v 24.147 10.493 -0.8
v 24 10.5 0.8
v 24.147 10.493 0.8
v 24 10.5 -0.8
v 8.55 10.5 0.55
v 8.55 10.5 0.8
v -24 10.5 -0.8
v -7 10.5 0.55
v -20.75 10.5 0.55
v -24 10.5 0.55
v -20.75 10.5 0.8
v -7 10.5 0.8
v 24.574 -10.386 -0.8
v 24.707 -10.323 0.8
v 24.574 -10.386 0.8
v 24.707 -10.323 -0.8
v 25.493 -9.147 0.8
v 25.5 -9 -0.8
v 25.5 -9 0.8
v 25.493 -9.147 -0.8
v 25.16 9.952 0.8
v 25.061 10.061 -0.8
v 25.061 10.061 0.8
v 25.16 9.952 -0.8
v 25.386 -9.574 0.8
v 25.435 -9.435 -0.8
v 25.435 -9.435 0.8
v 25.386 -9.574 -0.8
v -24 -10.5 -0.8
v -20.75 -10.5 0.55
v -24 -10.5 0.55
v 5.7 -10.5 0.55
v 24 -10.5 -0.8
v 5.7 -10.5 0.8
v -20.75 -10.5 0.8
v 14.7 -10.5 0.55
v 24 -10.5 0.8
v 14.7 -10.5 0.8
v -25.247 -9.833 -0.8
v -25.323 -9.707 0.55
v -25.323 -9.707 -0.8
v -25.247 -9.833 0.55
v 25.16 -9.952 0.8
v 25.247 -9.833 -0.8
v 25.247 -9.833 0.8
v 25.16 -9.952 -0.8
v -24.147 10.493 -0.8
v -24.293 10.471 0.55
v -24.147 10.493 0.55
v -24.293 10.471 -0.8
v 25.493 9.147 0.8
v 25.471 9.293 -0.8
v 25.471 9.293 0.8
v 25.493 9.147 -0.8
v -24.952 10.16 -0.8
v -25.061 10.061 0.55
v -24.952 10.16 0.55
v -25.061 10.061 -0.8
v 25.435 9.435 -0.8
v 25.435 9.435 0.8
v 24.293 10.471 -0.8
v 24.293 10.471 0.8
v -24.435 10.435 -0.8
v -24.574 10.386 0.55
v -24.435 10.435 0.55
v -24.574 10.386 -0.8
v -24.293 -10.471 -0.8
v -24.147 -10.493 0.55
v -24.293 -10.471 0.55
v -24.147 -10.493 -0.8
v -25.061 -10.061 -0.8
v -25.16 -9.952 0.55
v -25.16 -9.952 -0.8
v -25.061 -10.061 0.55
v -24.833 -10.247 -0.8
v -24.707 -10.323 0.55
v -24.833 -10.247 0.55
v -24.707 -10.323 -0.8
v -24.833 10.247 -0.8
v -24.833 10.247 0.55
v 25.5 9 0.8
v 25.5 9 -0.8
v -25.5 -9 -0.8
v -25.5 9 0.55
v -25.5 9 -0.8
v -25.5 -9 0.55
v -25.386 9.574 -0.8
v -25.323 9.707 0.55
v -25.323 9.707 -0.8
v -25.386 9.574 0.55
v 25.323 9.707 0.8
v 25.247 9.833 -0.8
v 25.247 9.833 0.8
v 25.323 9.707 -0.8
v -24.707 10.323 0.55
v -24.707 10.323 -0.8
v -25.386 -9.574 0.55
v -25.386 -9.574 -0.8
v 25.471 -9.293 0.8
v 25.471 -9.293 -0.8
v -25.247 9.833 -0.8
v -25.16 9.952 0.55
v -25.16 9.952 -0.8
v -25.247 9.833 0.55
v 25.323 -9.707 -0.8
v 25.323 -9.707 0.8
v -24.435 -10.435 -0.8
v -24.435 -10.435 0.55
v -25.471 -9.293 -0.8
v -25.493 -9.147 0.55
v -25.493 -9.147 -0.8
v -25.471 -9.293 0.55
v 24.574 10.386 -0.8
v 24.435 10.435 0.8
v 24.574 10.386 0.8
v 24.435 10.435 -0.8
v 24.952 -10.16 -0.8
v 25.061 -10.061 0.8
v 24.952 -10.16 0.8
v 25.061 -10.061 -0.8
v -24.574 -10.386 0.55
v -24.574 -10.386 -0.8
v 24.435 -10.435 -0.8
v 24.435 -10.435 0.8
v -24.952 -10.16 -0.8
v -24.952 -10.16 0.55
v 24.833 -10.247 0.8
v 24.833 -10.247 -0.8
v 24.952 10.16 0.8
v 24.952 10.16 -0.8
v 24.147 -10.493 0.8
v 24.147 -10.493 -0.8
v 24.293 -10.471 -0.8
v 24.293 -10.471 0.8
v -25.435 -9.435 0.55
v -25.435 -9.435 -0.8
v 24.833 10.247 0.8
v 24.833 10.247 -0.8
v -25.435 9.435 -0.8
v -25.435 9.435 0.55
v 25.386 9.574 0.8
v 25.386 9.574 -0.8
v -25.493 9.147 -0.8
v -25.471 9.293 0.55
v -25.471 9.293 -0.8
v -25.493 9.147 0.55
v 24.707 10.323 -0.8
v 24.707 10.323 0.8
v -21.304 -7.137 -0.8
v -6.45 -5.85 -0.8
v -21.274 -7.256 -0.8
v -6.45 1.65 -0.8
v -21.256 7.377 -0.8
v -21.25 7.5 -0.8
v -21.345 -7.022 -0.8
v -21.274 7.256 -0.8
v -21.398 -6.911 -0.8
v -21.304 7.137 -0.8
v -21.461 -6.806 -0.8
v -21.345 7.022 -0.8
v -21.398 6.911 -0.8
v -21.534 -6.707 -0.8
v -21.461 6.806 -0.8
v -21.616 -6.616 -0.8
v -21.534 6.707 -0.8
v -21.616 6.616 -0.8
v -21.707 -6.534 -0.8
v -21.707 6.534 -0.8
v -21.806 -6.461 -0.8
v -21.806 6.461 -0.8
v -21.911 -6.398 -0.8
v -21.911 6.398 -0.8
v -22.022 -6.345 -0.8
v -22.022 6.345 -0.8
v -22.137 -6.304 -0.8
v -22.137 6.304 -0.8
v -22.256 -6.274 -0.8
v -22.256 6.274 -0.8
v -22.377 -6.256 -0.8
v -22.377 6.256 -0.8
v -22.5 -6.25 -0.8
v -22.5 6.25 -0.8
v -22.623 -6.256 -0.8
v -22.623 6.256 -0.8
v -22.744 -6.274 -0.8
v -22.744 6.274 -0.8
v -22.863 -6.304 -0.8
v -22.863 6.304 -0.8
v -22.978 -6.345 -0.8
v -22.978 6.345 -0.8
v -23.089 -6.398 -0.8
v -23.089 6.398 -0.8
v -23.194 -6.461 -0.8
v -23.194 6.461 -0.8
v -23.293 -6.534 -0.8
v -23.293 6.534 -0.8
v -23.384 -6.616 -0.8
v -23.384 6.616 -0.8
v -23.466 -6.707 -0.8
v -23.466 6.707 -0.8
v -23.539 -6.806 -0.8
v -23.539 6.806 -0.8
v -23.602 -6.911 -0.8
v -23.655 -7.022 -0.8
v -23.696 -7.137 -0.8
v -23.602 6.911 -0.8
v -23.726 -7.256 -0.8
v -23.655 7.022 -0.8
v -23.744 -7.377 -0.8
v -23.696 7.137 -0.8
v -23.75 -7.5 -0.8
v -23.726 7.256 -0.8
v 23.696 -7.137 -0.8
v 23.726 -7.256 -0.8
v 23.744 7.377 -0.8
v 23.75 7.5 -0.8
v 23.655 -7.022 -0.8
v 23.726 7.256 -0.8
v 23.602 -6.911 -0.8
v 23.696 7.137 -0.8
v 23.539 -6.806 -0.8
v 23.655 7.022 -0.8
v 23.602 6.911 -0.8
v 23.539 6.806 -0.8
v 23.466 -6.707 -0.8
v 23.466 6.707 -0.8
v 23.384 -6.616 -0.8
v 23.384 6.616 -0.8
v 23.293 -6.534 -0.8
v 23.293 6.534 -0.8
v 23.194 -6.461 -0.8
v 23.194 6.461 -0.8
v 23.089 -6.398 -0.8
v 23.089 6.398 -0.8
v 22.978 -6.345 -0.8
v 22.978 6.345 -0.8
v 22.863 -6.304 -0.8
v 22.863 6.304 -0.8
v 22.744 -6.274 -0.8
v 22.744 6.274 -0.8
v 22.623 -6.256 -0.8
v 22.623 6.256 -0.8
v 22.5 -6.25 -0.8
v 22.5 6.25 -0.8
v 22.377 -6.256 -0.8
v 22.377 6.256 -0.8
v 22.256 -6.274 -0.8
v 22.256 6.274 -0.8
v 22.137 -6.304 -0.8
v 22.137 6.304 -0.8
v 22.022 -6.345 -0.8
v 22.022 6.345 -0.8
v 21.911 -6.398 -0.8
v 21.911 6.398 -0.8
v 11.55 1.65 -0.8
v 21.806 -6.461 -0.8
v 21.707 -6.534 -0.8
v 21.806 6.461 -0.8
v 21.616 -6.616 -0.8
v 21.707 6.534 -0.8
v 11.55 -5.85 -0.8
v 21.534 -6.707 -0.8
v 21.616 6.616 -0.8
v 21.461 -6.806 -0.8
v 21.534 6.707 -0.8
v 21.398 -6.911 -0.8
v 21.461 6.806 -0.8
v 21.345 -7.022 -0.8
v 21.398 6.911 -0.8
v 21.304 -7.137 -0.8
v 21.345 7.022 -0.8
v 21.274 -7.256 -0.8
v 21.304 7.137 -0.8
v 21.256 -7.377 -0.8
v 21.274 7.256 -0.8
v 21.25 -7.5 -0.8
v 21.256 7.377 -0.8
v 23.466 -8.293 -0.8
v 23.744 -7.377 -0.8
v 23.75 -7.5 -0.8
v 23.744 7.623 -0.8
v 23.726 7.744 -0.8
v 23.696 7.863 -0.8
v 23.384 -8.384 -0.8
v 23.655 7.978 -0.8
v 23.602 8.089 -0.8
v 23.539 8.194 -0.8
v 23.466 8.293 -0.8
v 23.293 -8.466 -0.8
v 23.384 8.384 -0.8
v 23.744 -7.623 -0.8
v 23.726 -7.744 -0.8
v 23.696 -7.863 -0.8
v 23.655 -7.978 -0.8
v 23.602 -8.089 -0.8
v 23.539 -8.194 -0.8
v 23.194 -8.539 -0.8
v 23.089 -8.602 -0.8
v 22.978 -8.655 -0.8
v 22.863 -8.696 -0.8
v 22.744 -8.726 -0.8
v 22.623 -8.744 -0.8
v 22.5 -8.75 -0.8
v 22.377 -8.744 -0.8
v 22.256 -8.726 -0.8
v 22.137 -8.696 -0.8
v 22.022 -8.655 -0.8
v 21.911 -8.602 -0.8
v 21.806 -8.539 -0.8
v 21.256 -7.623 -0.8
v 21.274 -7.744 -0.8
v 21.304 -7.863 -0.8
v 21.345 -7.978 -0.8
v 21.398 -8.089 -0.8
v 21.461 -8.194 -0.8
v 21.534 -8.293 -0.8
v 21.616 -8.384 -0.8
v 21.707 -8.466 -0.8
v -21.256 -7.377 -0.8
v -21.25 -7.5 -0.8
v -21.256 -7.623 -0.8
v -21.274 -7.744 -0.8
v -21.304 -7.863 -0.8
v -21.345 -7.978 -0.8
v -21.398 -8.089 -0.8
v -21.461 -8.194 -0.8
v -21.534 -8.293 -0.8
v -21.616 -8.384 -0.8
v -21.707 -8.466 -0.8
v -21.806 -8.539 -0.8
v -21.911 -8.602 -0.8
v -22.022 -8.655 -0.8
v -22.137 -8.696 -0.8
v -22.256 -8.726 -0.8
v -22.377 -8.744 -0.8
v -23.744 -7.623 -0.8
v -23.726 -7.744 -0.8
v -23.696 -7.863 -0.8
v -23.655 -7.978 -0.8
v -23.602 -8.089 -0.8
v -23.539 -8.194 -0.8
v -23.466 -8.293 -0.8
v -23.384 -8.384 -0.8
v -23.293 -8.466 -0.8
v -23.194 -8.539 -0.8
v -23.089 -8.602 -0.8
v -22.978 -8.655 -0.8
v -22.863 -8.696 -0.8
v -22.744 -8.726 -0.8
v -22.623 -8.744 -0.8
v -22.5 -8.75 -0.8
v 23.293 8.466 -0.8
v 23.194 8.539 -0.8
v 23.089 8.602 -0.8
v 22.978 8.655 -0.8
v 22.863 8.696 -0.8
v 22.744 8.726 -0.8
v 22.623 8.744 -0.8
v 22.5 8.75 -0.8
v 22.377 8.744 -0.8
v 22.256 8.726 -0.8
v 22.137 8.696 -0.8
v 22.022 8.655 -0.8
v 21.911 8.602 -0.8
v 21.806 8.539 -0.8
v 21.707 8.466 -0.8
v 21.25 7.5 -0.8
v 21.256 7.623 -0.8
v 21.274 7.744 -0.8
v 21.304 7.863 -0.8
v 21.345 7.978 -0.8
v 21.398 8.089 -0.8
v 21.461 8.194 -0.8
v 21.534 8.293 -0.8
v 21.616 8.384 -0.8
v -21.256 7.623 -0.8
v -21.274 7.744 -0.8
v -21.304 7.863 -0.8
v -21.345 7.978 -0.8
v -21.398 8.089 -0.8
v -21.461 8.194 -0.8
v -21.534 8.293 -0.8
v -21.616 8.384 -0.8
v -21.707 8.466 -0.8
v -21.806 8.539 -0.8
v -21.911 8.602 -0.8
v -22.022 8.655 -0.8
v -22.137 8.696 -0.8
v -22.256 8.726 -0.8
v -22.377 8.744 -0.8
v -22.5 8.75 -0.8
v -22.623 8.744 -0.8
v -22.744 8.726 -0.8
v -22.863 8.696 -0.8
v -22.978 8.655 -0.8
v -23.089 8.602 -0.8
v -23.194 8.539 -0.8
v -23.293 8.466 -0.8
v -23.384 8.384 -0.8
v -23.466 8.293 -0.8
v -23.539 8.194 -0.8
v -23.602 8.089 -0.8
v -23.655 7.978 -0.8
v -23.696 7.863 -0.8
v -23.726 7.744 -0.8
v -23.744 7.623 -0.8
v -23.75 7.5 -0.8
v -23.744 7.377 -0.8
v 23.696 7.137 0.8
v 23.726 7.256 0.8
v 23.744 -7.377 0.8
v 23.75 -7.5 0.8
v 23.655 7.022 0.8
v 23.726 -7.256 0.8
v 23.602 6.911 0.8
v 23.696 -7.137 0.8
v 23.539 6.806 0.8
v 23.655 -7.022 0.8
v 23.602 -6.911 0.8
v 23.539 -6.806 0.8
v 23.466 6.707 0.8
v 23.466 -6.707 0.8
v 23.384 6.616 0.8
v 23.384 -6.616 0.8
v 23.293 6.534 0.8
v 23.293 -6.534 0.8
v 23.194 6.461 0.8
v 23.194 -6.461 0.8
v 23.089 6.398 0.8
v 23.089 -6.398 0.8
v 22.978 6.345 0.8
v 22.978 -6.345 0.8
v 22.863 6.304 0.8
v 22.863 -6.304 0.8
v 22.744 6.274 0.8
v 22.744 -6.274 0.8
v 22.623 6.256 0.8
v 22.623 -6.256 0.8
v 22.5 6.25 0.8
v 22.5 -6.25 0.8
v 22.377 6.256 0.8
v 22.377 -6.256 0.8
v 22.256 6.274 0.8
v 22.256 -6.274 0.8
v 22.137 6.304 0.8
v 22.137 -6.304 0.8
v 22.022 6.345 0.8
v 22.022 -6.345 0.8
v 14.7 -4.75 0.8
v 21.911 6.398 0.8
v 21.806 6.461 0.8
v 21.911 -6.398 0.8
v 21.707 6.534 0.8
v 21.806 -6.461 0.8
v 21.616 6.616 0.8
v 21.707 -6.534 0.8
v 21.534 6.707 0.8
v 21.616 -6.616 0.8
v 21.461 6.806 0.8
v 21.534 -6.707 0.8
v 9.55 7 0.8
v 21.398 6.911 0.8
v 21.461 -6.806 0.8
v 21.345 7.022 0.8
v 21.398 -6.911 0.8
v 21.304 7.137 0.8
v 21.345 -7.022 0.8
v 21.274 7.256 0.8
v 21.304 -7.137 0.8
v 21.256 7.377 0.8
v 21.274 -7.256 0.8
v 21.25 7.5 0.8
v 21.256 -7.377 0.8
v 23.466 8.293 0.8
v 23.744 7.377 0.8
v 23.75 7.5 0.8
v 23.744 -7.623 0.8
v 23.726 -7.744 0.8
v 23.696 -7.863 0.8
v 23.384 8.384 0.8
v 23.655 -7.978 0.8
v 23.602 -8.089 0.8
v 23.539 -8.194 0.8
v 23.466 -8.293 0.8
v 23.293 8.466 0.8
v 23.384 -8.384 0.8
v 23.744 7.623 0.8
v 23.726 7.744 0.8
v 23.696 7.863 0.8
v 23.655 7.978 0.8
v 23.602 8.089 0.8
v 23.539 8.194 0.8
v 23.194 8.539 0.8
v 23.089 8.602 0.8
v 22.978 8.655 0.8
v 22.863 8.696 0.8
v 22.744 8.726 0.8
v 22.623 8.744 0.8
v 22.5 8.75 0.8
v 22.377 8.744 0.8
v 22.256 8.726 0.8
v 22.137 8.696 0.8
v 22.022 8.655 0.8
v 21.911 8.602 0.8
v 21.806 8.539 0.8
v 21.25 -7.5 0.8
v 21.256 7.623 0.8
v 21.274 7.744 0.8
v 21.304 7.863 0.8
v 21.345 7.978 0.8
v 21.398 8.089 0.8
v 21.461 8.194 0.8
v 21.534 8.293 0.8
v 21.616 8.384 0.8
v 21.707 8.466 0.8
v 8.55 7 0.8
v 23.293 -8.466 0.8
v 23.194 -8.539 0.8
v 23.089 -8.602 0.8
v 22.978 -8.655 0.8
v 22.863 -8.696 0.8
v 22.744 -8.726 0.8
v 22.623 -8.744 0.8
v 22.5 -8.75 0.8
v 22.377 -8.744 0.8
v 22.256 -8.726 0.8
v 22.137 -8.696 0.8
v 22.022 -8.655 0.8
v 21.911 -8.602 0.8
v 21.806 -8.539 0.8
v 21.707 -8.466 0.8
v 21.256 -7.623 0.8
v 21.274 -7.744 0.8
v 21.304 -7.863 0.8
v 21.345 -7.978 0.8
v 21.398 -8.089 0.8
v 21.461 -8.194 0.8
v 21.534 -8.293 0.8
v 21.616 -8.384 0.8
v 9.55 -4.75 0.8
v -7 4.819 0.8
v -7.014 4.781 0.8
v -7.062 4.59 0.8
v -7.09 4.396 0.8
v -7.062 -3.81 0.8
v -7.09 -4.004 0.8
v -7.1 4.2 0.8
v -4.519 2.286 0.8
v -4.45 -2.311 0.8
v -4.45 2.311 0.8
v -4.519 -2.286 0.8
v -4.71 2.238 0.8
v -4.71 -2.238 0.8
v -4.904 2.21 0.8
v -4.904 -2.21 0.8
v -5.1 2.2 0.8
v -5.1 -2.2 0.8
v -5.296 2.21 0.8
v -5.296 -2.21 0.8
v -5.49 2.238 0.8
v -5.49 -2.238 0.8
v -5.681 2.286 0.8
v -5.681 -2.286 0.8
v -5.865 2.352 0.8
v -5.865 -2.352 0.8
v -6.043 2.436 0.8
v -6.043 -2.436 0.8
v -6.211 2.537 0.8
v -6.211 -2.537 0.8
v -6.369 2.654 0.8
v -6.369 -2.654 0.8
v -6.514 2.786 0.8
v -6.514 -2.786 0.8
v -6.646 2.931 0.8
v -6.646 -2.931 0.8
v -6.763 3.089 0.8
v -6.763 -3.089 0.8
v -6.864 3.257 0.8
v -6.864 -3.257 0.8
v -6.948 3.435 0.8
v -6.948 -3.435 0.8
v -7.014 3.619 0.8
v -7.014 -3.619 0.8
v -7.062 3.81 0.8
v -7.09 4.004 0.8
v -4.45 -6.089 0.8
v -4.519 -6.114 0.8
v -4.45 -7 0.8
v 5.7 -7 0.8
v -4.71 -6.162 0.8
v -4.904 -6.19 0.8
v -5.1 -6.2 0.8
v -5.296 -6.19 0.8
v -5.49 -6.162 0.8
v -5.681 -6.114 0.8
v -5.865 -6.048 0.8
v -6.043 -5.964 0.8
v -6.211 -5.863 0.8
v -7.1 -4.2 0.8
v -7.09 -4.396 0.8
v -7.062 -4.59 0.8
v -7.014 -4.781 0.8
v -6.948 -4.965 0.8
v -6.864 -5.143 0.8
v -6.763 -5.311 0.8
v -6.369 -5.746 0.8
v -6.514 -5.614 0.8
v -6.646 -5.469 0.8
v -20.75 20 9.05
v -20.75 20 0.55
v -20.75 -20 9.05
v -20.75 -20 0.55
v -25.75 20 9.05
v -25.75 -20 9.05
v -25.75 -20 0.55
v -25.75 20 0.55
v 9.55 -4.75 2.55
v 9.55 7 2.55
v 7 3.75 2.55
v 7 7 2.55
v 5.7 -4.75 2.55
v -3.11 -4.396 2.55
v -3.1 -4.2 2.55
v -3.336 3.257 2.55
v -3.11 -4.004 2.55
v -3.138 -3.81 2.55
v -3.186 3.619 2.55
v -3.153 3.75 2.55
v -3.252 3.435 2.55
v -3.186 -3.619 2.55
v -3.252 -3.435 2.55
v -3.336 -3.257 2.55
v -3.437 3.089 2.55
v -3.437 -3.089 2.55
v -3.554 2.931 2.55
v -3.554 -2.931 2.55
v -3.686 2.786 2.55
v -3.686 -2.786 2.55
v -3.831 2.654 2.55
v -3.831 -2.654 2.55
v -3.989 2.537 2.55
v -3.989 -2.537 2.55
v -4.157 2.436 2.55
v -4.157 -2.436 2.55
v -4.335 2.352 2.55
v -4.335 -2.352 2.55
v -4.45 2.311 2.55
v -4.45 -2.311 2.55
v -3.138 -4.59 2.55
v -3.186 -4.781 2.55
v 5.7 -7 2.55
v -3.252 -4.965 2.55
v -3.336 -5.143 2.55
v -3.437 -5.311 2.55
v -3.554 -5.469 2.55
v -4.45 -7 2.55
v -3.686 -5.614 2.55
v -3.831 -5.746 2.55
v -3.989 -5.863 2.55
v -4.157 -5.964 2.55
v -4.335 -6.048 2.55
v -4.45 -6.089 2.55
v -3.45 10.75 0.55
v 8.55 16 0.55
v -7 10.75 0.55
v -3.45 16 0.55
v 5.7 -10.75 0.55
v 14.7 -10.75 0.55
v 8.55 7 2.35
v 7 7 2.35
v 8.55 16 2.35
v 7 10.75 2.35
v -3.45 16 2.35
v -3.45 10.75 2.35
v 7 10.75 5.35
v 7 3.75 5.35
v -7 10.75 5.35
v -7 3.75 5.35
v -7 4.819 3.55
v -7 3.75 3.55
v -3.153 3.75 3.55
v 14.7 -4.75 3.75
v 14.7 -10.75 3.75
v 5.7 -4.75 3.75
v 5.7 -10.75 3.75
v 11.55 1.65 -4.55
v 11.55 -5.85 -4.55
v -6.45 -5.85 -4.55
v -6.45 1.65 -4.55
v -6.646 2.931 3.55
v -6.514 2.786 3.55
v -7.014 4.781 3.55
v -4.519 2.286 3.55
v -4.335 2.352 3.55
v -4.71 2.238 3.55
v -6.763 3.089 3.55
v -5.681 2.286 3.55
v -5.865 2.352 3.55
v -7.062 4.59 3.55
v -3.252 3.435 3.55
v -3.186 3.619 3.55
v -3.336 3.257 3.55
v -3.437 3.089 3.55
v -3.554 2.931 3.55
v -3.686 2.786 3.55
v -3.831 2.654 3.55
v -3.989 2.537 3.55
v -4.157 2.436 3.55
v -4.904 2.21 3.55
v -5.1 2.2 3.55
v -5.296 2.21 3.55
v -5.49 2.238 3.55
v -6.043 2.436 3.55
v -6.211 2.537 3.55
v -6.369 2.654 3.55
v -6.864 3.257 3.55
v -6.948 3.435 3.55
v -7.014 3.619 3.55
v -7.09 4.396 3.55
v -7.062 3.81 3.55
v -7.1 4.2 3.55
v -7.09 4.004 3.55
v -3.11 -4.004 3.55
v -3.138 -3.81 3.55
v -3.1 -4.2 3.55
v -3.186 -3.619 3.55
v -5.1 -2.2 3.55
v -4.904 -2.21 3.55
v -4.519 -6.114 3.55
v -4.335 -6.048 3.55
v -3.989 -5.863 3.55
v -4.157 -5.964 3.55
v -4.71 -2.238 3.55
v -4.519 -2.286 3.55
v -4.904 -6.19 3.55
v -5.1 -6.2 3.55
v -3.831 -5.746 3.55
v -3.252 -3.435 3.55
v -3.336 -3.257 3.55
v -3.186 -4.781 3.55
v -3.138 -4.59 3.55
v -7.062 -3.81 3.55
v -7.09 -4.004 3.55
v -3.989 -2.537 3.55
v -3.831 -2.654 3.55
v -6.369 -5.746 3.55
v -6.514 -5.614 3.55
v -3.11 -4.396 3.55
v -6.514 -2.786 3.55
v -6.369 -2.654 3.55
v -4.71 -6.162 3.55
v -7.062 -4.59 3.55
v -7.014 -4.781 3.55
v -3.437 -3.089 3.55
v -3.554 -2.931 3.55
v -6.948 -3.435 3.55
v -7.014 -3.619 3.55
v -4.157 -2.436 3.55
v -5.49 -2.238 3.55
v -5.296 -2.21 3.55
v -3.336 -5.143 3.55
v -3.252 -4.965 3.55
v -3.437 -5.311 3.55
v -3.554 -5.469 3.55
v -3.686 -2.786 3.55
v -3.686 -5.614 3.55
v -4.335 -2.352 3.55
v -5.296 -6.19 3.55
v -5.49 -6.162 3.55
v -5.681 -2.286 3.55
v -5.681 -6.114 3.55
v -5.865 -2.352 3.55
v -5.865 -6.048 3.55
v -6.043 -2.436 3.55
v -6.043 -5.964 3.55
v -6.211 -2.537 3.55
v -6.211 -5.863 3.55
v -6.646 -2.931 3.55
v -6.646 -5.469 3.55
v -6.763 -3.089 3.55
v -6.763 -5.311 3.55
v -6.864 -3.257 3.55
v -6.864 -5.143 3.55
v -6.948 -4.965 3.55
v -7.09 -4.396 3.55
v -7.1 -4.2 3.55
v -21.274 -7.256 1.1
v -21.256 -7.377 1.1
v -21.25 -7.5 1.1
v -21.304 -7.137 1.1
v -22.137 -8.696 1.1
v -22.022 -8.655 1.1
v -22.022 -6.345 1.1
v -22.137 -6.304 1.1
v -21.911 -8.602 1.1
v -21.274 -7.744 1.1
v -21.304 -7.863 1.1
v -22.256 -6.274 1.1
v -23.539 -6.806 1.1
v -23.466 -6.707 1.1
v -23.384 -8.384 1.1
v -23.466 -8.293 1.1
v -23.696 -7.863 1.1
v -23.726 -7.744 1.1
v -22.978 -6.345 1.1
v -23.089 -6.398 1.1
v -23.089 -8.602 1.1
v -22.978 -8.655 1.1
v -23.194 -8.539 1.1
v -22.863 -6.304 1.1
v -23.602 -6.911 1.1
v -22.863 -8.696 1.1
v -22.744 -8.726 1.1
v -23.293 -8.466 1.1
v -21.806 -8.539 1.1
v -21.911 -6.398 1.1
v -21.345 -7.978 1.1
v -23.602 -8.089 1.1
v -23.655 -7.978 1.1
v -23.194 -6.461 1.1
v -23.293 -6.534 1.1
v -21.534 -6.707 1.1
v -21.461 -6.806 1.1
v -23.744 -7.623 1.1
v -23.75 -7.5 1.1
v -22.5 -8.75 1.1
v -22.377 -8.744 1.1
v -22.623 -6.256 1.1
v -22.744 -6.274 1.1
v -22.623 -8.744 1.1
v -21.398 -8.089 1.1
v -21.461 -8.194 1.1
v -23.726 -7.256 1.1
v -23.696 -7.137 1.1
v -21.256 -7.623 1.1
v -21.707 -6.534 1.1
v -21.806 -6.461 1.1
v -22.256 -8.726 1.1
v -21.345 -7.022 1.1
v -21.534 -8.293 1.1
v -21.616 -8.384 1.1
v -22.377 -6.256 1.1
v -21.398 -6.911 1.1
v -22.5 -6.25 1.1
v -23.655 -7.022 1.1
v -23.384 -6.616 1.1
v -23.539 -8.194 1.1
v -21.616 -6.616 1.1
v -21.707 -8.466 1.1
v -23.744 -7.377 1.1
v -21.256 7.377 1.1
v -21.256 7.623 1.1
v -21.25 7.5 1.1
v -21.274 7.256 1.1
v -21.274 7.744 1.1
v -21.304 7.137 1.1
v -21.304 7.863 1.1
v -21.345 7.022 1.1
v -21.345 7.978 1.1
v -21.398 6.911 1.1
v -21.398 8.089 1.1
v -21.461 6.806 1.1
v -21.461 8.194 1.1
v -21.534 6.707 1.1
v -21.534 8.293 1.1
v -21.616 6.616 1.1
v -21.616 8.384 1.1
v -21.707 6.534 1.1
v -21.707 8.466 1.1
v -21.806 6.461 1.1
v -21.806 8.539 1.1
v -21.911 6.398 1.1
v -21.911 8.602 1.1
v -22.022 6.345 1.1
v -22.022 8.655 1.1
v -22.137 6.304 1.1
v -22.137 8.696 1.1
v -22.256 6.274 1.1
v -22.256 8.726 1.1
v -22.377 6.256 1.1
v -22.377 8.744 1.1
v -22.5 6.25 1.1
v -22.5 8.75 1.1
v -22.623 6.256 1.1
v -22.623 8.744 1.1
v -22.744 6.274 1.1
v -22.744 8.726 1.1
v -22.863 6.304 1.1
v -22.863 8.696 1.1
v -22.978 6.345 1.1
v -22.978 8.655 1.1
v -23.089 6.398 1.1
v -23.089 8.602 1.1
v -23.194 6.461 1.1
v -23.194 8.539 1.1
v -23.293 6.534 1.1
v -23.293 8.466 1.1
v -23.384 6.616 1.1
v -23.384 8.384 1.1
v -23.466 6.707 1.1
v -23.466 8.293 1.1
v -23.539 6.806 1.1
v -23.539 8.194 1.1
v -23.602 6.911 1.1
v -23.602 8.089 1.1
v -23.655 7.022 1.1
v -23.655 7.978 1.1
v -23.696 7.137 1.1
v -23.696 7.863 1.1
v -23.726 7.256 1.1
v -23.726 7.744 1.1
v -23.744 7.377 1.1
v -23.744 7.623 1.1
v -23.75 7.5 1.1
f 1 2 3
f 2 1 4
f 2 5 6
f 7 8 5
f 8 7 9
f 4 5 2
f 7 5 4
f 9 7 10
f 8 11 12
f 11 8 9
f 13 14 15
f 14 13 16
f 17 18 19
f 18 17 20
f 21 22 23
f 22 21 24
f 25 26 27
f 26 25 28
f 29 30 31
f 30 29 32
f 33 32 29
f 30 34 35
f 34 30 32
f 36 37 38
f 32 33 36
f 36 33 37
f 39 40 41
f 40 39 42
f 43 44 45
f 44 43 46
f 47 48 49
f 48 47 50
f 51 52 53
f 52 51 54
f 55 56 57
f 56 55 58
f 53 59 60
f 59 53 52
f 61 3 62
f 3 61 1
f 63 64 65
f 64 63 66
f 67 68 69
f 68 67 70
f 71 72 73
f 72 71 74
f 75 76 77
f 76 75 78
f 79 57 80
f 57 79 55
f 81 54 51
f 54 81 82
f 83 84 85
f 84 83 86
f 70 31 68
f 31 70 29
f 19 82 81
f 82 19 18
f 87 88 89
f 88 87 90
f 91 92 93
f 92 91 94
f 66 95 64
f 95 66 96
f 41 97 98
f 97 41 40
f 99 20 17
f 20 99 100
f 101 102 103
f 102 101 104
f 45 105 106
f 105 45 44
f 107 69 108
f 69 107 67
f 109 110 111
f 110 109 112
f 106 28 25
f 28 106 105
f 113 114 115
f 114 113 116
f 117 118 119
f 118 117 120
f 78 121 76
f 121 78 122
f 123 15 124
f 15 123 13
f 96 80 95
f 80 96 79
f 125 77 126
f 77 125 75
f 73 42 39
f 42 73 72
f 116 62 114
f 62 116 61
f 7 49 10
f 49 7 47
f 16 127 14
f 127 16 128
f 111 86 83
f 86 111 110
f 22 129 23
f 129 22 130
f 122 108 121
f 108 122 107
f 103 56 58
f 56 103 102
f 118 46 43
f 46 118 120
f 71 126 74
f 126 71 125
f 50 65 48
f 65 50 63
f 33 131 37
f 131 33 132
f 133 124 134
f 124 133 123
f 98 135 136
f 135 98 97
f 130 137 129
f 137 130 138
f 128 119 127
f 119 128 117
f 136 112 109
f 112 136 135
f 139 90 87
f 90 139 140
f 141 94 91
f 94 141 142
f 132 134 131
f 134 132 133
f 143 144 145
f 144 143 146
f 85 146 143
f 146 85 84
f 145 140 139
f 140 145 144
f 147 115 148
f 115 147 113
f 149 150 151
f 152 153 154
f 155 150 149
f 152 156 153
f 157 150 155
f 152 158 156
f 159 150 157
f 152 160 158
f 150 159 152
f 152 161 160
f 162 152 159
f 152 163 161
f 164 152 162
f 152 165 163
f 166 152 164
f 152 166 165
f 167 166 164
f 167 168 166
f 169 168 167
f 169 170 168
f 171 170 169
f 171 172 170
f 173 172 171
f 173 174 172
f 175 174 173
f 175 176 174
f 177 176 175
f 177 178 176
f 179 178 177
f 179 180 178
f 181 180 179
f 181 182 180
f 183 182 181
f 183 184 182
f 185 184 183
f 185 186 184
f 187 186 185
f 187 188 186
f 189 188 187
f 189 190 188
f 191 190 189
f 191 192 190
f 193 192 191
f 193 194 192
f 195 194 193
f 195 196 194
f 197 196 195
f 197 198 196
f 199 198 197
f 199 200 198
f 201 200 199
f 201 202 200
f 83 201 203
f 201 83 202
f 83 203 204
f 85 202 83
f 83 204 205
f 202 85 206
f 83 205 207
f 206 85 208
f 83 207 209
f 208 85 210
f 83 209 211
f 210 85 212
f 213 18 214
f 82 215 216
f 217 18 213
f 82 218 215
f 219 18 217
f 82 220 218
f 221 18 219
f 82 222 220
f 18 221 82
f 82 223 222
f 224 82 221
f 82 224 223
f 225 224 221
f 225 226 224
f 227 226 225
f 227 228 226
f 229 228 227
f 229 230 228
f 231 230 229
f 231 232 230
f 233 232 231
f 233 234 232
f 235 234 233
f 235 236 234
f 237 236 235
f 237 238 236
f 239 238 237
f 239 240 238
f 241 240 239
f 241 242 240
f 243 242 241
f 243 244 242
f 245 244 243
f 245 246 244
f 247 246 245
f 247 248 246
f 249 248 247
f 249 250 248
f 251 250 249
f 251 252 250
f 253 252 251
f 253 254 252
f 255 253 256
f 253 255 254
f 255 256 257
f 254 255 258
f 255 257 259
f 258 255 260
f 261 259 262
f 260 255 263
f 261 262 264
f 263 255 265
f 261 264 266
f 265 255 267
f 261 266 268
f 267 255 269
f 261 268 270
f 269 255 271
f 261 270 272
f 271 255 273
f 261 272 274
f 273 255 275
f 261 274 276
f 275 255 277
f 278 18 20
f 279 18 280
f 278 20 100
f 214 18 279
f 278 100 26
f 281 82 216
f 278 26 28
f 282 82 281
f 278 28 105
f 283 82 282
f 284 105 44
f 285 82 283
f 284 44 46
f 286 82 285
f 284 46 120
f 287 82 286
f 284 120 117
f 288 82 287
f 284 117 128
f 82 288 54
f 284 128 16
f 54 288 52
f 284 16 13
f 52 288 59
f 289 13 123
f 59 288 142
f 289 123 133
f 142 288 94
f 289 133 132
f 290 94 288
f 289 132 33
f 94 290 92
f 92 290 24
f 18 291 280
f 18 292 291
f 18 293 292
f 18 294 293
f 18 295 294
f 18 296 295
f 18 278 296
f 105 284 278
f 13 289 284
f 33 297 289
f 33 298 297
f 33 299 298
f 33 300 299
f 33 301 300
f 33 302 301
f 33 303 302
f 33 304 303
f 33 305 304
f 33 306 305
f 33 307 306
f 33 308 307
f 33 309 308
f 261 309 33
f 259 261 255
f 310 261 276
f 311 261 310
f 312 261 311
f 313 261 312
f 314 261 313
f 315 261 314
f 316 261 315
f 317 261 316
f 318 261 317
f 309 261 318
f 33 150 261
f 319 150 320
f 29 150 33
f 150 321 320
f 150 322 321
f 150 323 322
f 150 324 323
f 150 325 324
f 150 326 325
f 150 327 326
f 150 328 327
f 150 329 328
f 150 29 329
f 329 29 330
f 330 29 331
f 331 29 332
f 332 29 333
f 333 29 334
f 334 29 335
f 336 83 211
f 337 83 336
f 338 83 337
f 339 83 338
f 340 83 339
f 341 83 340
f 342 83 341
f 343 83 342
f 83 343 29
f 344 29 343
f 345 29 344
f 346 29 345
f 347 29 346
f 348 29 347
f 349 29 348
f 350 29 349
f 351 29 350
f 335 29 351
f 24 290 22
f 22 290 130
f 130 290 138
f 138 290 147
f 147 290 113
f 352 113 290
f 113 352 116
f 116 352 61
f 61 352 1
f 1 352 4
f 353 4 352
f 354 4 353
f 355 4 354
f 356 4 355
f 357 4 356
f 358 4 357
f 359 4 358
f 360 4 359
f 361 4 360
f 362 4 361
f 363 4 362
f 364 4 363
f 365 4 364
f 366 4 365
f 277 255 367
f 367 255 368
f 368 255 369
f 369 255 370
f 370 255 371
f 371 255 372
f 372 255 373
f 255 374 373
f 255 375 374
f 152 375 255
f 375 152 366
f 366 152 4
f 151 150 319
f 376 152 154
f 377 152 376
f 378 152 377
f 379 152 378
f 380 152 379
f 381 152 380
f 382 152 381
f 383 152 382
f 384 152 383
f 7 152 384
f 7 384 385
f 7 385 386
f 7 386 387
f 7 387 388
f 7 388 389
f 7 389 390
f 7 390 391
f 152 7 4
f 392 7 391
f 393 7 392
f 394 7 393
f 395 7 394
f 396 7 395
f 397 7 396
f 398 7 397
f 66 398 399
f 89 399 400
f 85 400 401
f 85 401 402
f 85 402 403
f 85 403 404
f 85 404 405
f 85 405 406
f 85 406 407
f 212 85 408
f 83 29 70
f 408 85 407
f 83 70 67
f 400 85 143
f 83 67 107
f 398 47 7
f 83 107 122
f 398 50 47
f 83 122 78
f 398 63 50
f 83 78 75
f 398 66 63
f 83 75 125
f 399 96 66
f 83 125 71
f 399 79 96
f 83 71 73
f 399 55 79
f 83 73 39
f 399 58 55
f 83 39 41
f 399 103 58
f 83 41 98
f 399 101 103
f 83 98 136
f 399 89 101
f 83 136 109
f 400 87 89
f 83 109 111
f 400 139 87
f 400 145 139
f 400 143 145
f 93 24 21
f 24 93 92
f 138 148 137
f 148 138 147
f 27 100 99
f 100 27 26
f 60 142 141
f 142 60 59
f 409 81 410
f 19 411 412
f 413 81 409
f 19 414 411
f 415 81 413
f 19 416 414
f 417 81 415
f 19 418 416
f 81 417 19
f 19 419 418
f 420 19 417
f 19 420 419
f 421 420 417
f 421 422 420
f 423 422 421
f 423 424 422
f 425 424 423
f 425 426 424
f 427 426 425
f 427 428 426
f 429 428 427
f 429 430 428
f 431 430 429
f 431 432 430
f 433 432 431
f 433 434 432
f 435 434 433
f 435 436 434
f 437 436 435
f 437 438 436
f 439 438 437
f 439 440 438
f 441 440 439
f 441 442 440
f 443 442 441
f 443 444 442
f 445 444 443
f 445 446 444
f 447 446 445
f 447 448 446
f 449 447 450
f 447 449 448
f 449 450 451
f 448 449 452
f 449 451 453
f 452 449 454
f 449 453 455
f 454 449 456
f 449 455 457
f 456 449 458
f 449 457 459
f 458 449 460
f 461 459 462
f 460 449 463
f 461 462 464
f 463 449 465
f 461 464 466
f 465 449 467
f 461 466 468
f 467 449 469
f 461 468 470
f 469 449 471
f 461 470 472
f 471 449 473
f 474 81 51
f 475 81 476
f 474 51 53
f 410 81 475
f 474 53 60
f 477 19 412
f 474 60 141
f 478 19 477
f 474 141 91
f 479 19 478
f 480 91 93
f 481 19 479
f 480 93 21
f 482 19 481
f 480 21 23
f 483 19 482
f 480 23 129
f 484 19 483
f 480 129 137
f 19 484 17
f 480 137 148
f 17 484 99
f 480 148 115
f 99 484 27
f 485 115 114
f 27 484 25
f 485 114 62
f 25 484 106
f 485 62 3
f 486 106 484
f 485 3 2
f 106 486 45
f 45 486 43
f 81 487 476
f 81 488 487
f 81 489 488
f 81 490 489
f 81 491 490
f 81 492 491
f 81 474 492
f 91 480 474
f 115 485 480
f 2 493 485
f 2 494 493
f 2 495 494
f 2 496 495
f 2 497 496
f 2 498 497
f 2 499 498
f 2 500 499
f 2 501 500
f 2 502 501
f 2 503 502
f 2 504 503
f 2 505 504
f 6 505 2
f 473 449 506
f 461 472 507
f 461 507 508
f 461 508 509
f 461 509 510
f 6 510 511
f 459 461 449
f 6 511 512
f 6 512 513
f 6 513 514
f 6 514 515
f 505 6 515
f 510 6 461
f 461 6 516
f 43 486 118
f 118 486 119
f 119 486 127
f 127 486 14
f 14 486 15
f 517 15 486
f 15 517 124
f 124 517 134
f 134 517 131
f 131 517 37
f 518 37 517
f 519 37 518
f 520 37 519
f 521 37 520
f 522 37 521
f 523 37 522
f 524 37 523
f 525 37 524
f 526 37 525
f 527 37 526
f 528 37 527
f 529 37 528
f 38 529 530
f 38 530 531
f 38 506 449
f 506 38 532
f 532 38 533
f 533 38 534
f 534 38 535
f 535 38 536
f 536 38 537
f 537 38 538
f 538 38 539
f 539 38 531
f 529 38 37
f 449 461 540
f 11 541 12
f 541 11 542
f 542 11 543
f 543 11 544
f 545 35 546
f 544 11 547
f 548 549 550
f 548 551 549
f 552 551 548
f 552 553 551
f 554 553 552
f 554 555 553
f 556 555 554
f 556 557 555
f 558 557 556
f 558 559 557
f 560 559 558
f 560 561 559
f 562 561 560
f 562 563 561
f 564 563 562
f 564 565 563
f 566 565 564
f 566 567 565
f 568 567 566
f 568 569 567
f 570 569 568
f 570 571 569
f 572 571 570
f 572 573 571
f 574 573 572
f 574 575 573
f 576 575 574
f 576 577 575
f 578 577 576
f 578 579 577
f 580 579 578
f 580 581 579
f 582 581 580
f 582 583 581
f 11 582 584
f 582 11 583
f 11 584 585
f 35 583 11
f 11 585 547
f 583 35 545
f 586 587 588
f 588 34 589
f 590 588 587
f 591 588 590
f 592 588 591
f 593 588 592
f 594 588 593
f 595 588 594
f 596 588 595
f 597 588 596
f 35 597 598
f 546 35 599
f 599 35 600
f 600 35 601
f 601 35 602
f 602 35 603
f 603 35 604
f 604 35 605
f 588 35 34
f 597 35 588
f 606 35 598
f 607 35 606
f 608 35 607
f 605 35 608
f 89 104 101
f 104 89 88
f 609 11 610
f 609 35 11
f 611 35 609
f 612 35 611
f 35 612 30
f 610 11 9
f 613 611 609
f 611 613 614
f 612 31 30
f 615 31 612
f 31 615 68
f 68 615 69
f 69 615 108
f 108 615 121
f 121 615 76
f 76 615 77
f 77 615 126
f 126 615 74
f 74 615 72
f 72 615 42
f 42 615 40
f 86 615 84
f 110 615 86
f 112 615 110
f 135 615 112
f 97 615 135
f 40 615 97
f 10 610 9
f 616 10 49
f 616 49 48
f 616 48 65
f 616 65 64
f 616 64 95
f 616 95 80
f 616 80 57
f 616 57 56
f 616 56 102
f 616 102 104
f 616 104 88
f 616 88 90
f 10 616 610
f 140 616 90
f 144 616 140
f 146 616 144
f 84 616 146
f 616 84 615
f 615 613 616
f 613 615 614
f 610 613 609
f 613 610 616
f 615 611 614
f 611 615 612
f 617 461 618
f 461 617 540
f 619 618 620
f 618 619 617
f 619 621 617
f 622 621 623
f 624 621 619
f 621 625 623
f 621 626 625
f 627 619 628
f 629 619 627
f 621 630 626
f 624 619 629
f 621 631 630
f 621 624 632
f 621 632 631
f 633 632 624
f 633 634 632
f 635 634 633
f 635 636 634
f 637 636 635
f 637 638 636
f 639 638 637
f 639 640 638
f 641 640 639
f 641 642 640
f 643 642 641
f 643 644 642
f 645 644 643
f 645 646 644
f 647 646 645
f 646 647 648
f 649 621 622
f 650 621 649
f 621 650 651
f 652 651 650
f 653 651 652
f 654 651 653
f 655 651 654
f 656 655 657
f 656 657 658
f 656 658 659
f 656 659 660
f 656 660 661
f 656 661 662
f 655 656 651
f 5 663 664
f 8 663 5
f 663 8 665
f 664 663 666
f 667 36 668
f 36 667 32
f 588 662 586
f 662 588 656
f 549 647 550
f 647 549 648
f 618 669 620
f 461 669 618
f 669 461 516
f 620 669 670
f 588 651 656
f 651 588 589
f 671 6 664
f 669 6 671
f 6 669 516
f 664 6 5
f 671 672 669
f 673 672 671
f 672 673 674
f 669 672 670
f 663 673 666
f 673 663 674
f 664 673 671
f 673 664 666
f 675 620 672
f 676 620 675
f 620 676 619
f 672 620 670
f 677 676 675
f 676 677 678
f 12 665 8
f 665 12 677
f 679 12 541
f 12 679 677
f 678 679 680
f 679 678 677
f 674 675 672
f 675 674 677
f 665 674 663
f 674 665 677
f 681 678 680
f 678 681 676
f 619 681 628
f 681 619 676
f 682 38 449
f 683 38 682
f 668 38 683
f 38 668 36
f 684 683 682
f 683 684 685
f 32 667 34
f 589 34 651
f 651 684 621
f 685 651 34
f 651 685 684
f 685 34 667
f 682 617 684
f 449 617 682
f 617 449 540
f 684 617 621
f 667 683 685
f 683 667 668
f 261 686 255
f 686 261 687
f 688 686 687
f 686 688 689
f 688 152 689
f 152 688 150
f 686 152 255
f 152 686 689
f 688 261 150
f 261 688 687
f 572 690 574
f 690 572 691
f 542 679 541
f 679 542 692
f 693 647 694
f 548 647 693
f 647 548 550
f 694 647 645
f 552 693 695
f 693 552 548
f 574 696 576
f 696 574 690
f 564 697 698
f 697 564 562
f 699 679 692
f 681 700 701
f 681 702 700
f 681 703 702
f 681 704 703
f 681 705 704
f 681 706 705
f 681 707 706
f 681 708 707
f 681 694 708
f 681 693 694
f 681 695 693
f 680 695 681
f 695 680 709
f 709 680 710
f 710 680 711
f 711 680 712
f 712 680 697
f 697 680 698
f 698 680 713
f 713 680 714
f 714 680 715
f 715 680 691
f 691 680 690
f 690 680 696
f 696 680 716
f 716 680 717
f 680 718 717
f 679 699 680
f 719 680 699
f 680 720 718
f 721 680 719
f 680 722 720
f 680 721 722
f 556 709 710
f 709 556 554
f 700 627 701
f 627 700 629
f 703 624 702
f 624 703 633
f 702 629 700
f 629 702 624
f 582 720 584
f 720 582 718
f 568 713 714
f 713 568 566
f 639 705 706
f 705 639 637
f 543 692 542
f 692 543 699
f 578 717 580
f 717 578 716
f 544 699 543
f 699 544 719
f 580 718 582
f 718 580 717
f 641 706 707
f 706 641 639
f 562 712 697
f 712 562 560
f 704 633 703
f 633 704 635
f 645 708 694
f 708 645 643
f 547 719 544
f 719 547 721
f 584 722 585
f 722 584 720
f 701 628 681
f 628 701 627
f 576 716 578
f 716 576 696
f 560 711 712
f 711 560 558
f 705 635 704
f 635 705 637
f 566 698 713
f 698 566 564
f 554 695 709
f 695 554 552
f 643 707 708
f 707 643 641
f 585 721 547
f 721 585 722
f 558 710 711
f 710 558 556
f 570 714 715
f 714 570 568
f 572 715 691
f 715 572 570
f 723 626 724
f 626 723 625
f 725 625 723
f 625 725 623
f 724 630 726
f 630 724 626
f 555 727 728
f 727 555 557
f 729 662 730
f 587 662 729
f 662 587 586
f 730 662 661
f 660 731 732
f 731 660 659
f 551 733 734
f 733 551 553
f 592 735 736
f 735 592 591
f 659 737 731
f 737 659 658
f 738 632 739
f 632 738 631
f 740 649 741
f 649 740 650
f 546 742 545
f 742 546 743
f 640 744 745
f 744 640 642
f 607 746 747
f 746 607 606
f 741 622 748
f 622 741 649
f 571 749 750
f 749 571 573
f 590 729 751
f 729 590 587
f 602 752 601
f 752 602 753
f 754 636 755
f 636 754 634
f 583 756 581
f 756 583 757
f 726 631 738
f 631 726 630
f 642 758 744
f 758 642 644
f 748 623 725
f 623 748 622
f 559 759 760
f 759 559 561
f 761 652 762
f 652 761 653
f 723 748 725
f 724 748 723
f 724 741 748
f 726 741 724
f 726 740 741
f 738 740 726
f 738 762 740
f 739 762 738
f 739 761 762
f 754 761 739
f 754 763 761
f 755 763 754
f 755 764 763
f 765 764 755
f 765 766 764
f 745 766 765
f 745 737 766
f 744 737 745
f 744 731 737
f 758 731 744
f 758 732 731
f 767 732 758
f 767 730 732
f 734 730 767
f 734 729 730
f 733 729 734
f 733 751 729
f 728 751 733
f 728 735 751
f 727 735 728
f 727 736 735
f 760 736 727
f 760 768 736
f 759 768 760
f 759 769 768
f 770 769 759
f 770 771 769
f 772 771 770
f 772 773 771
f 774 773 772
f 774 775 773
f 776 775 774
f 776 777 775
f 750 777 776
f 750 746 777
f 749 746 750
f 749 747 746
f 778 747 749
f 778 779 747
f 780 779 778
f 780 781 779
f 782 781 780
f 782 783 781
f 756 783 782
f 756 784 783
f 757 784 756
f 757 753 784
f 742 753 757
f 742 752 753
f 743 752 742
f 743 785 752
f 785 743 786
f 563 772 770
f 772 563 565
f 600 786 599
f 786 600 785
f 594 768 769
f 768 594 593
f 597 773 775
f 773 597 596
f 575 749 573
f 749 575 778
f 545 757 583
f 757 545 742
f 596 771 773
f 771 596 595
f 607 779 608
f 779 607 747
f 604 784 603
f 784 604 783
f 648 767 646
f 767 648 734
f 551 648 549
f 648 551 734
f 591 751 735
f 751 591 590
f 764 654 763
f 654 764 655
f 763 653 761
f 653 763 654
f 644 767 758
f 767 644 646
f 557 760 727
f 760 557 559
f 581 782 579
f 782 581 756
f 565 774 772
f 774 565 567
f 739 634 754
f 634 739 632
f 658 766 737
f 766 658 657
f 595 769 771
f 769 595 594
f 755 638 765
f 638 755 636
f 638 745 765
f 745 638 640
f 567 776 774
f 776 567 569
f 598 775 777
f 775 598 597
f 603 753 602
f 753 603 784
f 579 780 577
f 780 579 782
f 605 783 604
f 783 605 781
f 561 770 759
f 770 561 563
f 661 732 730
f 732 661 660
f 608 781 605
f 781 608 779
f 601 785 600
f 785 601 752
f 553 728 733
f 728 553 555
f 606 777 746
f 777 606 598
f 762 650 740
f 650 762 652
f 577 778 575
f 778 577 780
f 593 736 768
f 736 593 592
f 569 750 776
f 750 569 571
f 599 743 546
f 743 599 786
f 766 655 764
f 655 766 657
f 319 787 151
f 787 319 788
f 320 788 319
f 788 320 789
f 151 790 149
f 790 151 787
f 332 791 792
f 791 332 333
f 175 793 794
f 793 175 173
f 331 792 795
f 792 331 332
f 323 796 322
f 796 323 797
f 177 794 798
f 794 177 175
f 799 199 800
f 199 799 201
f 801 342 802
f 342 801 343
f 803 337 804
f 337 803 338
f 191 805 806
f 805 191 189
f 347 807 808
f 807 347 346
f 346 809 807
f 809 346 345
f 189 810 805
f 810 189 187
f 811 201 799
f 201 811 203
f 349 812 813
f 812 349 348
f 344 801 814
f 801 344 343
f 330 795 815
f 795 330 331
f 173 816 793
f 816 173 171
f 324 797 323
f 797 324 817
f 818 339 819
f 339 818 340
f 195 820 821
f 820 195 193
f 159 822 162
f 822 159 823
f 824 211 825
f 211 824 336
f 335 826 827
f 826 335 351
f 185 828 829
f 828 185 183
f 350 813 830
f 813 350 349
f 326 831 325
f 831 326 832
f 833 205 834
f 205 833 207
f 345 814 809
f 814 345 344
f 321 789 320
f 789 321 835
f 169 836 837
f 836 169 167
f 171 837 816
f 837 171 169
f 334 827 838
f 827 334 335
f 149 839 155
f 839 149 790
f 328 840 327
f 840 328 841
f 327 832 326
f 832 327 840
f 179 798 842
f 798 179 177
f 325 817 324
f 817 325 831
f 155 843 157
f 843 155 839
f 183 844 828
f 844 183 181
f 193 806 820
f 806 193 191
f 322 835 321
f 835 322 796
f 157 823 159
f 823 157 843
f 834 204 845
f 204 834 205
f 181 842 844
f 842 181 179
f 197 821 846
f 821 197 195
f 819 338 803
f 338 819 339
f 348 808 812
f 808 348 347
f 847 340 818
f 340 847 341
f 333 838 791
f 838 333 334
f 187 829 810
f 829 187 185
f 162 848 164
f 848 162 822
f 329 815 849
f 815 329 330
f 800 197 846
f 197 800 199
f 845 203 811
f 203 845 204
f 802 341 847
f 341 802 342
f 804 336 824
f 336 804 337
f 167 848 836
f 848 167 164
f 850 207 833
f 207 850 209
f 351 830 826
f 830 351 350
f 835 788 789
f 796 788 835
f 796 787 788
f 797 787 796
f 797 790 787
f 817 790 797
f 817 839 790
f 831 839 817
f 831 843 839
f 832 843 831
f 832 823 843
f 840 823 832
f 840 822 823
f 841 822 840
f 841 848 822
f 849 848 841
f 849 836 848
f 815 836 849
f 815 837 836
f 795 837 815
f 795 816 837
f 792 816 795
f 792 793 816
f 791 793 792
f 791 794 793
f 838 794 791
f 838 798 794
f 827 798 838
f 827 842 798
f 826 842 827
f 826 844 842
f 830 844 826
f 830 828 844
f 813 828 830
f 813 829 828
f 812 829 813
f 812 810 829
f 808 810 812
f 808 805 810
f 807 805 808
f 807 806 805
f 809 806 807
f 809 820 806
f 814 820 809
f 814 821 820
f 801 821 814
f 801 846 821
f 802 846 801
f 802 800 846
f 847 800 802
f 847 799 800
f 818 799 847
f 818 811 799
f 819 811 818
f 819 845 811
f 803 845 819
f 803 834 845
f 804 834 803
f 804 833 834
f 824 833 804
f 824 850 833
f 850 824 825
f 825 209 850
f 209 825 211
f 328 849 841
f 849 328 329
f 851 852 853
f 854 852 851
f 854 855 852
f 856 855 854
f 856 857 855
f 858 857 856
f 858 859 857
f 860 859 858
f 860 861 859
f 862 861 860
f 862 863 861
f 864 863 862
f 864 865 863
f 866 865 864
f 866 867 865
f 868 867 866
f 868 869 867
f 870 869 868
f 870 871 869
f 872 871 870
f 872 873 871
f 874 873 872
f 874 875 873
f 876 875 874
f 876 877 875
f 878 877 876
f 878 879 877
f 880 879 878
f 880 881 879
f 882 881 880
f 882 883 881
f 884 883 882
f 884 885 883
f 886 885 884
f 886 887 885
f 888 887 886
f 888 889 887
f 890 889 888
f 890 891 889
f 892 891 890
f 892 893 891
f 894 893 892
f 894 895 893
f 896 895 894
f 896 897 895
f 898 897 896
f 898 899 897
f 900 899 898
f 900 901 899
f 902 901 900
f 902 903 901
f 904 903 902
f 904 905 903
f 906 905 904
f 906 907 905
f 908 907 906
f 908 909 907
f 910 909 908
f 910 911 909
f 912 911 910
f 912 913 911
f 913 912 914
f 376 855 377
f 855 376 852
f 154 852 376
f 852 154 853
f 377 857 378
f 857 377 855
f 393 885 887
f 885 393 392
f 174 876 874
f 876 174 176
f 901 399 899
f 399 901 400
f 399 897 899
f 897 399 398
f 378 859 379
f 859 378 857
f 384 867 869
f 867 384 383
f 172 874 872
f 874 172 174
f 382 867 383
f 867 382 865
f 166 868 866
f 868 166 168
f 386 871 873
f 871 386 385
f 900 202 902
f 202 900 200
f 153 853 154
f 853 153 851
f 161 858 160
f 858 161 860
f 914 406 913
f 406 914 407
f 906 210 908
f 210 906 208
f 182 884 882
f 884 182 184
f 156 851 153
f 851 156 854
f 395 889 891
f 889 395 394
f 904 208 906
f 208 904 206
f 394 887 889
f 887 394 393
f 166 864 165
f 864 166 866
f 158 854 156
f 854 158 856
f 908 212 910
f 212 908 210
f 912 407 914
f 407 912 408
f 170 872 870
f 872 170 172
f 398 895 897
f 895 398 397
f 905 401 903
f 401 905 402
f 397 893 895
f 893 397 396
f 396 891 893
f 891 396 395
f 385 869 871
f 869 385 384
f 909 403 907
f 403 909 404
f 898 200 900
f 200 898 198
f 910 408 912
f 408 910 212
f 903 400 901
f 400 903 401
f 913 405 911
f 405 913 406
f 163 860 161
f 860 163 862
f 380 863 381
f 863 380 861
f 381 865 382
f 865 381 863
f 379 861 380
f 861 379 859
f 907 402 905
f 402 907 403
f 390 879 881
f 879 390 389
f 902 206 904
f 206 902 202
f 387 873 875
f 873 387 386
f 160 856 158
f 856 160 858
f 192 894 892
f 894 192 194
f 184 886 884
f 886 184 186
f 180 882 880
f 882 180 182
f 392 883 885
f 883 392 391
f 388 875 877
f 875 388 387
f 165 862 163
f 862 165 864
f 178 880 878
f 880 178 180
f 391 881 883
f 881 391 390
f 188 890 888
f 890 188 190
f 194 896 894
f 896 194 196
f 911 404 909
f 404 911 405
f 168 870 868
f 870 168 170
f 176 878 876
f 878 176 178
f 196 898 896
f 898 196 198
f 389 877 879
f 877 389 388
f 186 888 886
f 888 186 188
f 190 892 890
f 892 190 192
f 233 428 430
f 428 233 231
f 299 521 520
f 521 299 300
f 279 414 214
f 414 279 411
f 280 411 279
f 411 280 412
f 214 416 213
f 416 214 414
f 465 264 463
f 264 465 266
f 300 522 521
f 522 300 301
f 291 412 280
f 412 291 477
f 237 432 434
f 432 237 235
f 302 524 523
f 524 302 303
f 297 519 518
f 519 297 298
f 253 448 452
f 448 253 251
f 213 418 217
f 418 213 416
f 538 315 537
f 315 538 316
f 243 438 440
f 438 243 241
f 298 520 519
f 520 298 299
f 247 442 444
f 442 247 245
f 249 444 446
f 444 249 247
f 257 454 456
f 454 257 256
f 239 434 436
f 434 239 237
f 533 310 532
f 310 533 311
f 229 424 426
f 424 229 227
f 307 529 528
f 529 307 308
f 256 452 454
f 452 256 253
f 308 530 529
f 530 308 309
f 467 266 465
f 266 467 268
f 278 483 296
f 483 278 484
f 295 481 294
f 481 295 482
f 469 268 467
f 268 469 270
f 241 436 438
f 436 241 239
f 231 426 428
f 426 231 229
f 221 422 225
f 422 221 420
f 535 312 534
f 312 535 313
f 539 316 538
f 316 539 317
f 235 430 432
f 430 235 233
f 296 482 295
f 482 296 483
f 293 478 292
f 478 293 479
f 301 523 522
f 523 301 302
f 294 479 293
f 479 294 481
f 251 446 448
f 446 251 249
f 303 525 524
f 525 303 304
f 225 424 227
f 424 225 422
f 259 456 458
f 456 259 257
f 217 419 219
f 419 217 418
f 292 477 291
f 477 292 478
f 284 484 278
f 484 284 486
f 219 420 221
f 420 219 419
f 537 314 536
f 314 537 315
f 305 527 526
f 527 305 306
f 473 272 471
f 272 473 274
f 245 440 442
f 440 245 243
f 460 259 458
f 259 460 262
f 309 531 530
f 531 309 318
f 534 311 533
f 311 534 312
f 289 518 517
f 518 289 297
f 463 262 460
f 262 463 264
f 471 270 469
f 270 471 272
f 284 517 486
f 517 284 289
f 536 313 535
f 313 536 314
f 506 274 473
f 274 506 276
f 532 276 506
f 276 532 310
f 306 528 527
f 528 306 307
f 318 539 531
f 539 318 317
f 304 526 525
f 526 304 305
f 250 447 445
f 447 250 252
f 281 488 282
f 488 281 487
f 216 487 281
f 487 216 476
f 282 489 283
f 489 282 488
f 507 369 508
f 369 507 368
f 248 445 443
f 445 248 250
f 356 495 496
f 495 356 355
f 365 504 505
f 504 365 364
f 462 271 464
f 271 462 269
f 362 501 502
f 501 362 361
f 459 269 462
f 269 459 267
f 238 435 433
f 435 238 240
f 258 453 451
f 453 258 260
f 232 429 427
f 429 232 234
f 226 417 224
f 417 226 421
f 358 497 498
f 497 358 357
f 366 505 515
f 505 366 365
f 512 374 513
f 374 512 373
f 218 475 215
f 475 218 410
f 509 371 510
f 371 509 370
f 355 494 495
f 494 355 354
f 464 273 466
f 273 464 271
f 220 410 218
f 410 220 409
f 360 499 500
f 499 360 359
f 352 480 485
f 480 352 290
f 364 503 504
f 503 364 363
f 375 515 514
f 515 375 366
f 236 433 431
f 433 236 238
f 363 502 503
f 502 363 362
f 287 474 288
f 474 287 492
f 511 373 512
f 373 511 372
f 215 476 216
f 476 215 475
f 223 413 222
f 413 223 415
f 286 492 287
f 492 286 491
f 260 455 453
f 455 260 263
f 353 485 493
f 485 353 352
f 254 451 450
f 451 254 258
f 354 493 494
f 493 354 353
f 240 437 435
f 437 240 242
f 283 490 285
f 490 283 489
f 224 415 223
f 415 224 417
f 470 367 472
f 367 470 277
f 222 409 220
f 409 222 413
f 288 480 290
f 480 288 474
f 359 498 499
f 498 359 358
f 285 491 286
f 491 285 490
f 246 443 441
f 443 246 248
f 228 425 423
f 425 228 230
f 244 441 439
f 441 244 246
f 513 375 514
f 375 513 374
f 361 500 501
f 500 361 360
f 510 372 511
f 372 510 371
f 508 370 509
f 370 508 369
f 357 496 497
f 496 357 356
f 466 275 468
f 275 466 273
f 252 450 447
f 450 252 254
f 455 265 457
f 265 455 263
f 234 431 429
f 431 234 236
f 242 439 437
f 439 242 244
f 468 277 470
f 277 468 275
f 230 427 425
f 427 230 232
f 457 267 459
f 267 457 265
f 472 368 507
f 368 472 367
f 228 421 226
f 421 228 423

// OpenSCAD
$fn = 64;

// Single-board computer overall size (board only) — VERIFIED DIMENSIONS
board_x = 51.0;
board_y = 21.0;
board_z = 1.6;

// Small overlap to guarantee connectivity between parts
overlap = 0.25;

// ---------- Helpers ----------
module rounded_rect_prism(x, y, z, r) {
    hull() {
        for (sx = [-1, 1], sy = [-1, 1])
            translate([sx*(x/2 - r), sy*(y/2 - r), 0])
                cylinder(r=r, h=z, center=true);
    }
}

module mount_hole_pattern(x, y, inset_x, inset_y, hole_r, hole_h) {
    for (sx = [-1, 1], sy = [-1, 1])
        translate([sx*(x/2 - inset_x), sy*(y/2 - inset_y), 0])
            cylinder(r=hole_r, h=hole_h, center=true);
}

// ---------- Board + features (ONE connected solid) ----------
module sbc() {
    corner_r = 1.5;

    // Mounting holes
    hole_r = 1.25;          // ~2.5mm diameter
    hole_inset_x = 3.0;
    hole_inset_y = 3.0;

    // Z references
    z_top = board_z/2;
    z_bot = -board_z/2;

    // --- SBC-identifiable components/layout (all connected via overlap) ---

    // Long GPIO header along one long edge (x-), like many SBCs
    gpio_w = 5.0;
    gpio_len = 40.0;
    gpio_h = 8.5;

    // CPU package (top side)
    cpu_x = 14.0;
    cpu_y = 14.0;
    cpu_h = 2.0;

    // RAM package (top side)
    ram_x = 12.0;
    ram_y = 10.0;
    ram_h = 1.8;

    // USB-like connector on one short edge (y+)
    usb_w = 14.0;
    usb_d = 7.0;
    usb_h = 4.8;

    // Power connector on opposite short edge (y-)
    pwr_w = 9.0;
    pwr_d = 6.0;
    pwr_h = 3.2;

    // Bottom-side large connector/port block (to match views)
    bot_w = 18.0;
    bot_d = 7.5;
    bot_h = 4.0;

    // Two small passives (top side)
    cap_r = 2.0;
    cap_h = 3.0;

    difference() {
        union() {
            // PCB
            color([0.05, 0.45, 0.12])
                rounded_rect_prism(board_x, board_y, board_z, corner_r);

            // GPIO header (x- edge), centered in Y, overlaps into PCB
            color([0.10, 0.10, 0.10])
                translate([
                    -board_x/2 + gpio_w/2 - overlap,
                    0,
                    z_top + gpio_h/2 - overlap
                ])
                    cube([gpio_w, gpio_len, gpio_h], center=true);

            // CPU (center-ish), overlaps into PCB
            color([0.15, 0.15, 0.15])
                translate([
                    board_x*0.05,
                    0,
                    z_top + cpu_h/2 - overlap
                ])
                    cube([cpu_x, cpu_y, cpu_h], center=true);

            // RAM (near CPU), overlaps into PCB
            color([0.18, 0.18, 0.18])
                translate([
                    board_x*0.05,
                    cpu_y/2 + ram_y/2 - 1.0,
                    z_top + ram_h/2 - overlap
                ])
                    cube([ram_x, ram_y, ram_h], center=true);

            // USB connector (y+ edge), overlaps into PCB
            color([0.75, 0.75, 0.78])
                translate([
                    0,
                    board_y/2 - usb_d/2 + overlap,
                    z_top + usb_h/2 - overlap
                ])
                    cube([usb_w, usb_d, usb_h], center=true);

            // Power connector (y- edge), overlaps into PCB
            color([0.75, 0.75, 0.78])
                translate([
                    board_x*0.20,
                    -board_y/2 + pwr_d/2 - overlap,
                    z_top + pwr_h/2 - overlap
                ])
                    cube([pwr_w, pwr_d, pwr_h], center=true);

            // Bottom-side connector block (underside), overlaps into PCB
            color([0.65, 0.65, 0.68])
                translate([
                    board_x*0.05,
                    -board_y*0.10,
                    z_bot - bot_h/2 + overlap
                ])
                    cube([bot_w, bot_d, bot_h], center=true);

            // Two capacitors (top side), overlap into PCB
            color([0.20, 0.20, 0.20])
                translate([
                    -board_x*0.10,
                    board_y*0.20,
                    z_top + cap_h/2 - overlap
                ])
                    cylinder(r=cap_r, h=cap_h, center=true);

            color([0.20, 0.20, 0.20])
                translate([
                    -board_x*0.10,
                    -board_y*0.20,
                    z_top + cap_h/2 - overlap
                ])
                    cylinder(r=cap_r, h=cap_h, center=true);
        }

        // Mounting holes through PCB only
        mount_hole_pattern(board_x, board_y, hole_inset_x, hole_inset_y, hole_r, board_z + 0.6);
    }
}

sbc();
